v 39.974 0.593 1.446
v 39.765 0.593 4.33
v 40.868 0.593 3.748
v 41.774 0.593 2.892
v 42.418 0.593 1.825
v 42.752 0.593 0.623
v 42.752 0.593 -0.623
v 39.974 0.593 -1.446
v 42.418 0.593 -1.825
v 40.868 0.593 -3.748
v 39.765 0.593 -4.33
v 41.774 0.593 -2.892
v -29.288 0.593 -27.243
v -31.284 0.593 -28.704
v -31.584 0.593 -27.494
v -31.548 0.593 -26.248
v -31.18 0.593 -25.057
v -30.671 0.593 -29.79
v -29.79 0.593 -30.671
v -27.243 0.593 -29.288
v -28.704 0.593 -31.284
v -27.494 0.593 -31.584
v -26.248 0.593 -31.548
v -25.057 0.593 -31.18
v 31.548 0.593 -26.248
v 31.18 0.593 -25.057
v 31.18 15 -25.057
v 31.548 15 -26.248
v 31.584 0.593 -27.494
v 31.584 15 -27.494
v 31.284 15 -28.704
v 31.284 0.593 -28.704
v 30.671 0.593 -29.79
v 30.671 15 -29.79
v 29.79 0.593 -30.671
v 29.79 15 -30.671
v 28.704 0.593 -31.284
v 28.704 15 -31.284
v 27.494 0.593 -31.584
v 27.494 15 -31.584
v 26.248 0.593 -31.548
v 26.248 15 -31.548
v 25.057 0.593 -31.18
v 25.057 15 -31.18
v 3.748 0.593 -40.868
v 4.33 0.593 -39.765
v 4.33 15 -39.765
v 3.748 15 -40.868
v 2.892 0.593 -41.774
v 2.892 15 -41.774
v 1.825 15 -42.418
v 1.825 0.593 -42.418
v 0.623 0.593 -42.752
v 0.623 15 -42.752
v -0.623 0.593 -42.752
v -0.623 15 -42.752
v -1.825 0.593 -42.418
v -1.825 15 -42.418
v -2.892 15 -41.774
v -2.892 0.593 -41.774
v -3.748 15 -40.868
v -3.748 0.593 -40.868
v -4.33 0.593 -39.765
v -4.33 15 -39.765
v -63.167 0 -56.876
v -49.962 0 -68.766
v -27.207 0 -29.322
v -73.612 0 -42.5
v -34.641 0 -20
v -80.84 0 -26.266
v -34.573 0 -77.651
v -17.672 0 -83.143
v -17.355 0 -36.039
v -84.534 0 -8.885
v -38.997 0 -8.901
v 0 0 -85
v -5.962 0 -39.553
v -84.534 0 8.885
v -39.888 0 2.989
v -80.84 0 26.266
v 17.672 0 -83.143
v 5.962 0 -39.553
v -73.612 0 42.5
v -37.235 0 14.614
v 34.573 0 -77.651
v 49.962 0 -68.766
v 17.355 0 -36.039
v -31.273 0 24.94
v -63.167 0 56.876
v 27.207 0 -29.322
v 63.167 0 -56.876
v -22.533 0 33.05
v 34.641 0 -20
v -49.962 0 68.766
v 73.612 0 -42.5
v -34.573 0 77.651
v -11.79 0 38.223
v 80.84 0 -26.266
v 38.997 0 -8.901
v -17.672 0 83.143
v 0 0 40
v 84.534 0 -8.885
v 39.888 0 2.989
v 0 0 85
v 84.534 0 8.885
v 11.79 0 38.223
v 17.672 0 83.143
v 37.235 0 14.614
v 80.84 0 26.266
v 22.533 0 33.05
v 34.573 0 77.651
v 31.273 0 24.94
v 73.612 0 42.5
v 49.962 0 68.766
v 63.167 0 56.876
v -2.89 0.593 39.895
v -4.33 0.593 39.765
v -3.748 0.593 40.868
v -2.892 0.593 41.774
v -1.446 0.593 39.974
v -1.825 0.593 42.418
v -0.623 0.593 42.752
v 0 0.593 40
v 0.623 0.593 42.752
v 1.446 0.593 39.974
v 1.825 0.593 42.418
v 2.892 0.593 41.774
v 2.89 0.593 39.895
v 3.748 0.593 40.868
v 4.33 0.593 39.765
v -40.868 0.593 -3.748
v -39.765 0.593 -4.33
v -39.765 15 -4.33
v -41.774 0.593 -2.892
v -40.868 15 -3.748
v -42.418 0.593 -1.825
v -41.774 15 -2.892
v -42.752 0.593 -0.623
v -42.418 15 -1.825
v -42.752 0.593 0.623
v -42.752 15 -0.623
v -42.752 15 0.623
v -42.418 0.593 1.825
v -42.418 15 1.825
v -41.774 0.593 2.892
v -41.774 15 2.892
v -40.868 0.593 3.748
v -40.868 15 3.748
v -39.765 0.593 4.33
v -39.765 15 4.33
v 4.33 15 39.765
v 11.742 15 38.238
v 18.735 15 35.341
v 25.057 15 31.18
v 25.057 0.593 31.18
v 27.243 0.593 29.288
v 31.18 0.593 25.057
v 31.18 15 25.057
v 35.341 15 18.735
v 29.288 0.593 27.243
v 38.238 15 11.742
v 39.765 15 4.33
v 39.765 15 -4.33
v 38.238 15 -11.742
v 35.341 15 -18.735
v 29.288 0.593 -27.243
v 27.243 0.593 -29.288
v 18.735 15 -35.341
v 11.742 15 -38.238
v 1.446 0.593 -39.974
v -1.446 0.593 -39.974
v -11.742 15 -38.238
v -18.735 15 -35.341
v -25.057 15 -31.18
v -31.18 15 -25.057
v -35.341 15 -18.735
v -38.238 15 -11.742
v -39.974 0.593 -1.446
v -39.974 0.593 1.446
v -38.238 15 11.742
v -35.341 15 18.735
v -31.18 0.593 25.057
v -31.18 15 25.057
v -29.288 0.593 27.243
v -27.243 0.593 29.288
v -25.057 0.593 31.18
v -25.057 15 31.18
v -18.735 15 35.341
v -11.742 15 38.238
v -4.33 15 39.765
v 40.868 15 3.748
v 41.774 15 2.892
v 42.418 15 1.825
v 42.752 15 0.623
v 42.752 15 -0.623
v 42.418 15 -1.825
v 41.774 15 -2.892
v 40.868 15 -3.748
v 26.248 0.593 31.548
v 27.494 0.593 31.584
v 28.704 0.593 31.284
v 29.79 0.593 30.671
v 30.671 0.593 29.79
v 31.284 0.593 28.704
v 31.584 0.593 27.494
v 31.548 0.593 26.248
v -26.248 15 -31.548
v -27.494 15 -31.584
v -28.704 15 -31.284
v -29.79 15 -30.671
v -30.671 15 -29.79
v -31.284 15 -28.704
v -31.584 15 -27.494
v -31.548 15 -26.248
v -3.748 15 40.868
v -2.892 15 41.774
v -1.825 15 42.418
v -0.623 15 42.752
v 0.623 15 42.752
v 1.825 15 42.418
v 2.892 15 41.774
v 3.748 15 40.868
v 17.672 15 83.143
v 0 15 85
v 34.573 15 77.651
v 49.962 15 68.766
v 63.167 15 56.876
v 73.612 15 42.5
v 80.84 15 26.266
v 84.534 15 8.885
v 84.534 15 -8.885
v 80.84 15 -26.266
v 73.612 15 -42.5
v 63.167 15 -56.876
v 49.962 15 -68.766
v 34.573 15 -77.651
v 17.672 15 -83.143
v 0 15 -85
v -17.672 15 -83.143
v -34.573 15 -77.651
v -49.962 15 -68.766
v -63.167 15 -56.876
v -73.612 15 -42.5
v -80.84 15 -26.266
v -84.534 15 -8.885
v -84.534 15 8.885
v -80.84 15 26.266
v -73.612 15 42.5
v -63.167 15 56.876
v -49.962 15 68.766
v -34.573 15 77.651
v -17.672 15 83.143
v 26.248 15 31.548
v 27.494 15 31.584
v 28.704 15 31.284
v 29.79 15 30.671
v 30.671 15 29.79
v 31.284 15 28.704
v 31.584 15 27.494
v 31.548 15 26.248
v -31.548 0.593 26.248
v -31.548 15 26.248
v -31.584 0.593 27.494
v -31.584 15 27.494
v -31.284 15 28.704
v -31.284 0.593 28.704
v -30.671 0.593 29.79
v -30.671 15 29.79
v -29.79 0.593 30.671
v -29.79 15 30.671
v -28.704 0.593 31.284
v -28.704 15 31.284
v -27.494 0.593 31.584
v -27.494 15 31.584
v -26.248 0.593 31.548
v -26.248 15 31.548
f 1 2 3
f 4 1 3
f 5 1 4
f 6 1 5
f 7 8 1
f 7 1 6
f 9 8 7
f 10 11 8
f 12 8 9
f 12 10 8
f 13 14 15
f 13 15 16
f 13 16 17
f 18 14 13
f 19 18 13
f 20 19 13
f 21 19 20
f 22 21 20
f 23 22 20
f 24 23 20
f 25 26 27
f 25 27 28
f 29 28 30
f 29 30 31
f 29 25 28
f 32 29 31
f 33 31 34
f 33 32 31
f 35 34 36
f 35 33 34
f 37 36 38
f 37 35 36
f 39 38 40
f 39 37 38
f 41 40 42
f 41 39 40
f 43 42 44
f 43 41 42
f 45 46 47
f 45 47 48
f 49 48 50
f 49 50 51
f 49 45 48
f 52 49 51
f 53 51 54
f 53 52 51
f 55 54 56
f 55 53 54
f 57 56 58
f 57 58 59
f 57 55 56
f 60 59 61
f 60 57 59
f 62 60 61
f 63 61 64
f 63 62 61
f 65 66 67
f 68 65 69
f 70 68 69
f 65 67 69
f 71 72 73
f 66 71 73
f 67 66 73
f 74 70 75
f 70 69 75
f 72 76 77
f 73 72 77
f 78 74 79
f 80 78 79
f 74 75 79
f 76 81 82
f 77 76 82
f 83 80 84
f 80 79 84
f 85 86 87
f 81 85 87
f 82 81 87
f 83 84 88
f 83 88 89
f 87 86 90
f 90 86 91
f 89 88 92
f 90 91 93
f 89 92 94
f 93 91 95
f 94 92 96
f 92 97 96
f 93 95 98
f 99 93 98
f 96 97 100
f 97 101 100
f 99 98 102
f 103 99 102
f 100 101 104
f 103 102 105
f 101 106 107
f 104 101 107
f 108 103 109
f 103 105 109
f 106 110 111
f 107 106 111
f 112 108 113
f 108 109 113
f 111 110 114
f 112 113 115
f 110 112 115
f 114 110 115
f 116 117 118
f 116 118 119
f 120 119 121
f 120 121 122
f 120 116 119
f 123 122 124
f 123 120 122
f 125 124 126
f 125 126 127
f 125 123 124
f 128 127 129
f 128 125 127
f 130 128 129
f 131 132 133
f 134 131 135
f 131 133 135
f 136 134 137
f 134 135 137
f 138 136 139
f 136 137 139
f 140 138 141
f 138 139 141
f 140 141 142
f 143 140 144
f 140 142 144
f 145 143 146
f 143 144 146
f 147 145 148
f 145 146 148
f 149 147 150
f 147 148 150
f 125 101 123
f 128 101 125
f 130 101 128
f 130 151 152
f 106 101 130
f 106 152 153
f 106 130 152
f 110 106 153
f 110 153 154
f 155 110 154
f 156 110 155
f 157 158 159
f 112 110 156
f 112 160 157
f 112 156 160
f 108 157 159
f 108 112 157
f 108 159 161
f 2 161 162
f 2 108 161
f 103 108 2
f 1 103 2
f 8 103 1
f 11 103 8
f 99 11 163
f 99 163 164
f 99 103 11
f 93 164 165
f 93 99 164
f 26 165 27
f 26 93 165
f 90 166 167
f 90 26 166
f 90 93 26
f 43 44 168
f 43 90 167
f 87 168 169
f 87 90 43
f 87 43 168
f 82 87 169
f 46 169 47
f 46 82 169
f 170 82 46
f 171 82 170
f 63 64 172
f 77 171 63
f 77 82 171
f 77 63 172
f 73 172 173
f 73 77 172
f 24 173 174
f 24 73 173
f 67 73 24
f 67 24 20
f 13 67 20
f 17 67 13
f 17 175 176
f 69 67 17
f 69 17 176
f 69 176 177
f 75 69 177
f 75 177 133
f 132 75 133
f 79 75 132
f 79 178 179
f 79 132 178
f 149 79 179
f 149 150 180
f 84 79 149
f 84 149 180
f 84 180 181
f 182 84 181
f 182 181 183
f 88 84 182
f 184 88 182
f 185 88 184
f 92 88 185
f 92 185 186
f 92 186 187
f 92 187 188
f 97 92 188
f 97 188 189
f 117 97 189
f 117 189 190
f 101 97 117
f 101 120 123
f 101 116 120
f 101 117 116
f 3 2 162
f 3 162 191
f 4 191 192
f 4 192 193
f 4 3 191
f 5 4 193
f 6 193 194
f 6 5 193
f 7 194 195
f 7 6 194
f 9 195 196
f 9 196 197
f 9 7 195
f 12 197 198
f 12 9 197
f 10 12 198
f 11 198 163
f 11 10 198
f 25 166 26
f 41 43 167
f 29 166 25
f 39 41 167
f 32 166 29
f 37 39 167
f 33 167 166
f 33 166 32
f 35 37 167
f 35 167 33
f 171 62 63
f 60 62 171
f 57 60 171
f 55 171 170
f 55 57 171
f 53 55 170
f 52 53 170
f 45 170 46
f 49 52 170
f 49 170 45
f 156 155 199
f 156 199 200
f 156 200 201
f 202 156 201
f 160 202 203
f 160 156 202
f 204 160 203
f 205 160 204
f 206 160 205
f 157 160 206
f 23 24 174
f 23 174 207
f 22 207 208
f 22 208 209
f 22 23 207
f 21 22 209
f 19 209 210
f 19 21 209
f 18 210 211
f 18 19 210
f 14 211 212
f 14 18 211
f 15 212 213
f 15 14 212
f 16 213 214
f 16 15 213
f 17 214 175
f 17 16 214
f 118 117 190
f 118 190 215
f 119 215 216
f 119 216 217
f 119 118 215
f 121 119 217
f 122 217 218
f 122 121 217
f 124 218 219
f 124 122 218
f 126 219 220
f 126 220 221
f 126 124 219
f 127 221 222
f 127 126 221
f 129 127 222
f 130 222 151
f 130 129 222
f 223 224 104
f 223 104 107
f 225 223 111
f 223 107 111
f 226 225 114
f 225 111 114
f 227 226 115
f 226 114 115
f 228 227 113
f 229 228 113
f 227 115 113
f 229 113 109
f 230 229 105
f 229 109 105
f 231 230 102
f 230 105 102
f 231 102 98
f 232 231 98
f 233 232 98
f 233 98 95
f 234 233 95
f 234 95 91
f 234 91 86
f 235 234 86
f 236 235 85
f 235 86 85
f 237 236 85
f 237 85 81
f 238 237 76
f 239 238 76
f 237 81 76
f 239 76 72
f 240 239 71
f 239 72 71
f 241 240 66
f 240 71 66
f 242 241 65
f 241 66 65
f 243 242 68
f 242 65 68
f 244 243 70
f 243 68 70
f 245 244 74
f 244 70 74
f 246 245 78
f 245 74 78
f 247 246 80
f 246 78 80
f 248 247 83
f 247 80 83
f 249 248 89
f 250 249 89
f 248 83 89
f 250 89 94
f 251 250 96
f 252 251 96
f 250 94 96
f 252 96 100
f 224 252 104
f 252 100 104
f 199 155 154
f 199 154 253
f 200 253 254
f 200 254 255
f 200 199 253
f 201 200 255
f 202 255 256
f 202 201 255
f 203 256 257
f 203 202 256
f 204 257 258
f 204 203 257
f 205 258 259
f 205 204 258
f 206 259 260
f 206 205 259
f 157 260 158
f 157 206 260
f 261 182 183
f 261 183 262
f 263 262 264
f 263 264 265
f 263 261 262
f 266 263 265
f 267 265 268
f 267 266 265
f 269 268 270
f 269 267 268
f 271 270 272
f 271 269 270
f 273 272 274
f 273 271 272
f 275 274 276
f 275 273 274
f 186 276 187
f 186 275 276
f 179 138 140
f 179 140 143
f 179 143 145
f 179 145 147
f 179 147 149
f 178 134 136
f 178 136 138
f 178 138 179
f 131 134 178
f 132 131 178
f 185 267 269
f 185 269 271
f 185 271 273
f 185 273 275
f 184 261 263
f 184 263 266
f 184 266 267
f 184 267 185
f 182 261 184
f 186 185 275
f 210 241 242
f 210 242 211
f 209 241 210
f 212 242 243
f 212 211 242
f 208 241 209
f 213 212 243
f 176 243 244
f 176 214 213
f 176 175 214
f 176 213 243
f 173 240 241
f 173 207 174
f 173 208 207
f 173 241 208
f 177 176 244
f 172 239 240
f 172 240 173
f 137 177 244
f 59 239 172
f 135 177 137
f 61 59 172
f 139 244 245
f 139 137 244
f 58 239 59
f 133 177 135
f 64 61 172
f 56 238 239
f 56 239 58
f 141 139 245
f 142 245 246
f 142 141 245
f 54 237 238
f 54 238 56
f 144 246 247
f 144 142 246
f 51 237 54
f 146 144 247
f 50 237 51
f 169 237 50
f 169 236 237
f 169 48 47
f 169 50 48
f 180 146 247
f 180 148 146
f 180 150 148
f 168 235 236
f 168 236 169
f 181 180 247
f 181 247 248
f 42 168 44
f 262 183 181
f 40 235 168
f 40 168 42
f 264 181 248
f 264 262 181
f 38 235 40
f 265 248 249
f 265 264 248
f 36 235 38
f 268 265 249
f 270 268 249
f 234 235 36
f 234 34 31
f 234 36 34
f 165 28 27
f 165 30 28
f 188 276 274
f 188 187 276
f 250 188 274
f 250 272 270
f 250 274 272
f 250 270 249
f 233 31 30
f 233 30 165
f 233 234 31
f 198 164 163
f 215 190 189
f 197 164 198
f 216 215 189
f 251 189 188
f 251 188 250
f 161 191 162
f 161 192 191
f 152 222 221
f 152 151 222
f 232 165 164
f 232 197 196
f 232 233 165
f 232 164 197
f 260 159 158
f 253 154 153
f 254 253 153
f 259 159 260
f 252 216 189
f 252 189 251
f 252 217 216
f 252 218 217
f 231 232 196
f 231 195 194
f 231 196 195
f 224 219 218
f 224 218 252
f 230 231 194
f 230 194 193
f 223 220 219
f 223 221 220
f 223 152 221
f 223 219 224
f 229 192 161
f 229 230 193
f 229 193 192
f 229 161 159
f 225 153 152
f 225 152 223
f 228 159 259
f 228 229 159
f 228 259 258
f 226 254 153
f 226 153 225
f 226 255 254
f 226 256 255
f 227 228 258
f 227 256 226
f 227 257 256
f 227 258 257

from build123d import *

# Parameters (mm, degrees)
SKETCH1_R           = 85
BOSS_EXTRUDE1_DEPTH = 15
SKETCH2_R           = 40
CUT_EXTRUDE1_DEPTH  = 122.140414396
SKETCH3_R           = 4.608597006
CUT_EXTRUDE2_DEPTH  = 14.406552789
CIRPATTERN1_COUNT   = 8


with BuildPart() as part:
    # Sketch1 → Boss-Extrude1 (new body)
    with BuildSketch(Plane(origin=(0, 0, 0), x_dir=(1, 0, 0), z_dir=(0, 1, 0))):
        Circle(SKETCH1_R)
    extrude(amount=BOSS_EXTRUDE1_DEPTH)

    # Sketch2 → Cut-Extrude1 (cut, through all)
    with BuildSketch(Plane(origin=(0, 0, 0), x_dir=(1, 0, 0), z_dir=(0, 1, 0))):
        Circle(SKETCH2_R)
    extrude(amount=CUT_EXTRUDE1_DEPTH, mode=Mode.SUBTRACT)

    # Sketch3 → Cut-Extrude2 (cut)
    with BuildSketch(Plane(origin=(0, 15, 0), x_dir=(1, 0, 0), z_dir=(0, 1, 0))):
        with Locations((-38.186141272, 0)):
            Circle(SKETCH3_R)
    cut_extrude2 = extrude(amount=-CUT_EXTRUDE2_DEPTH, mode=Mode.SUBTRACT)

    # CirPattern1: Cut-Extrude2 ×8 about axis
    cirpattern1_axis = Axis((0, 0, 0), (0, 1, 0))
    for i in range(1, CIRPATTERN1_COUNT):
        add(cut_extrude2.rotate(cirpattern1_axis, i * 360 / CIRPATTERN1_COUNT), mode=Mode.SUBTRACT)


solid = part.part
